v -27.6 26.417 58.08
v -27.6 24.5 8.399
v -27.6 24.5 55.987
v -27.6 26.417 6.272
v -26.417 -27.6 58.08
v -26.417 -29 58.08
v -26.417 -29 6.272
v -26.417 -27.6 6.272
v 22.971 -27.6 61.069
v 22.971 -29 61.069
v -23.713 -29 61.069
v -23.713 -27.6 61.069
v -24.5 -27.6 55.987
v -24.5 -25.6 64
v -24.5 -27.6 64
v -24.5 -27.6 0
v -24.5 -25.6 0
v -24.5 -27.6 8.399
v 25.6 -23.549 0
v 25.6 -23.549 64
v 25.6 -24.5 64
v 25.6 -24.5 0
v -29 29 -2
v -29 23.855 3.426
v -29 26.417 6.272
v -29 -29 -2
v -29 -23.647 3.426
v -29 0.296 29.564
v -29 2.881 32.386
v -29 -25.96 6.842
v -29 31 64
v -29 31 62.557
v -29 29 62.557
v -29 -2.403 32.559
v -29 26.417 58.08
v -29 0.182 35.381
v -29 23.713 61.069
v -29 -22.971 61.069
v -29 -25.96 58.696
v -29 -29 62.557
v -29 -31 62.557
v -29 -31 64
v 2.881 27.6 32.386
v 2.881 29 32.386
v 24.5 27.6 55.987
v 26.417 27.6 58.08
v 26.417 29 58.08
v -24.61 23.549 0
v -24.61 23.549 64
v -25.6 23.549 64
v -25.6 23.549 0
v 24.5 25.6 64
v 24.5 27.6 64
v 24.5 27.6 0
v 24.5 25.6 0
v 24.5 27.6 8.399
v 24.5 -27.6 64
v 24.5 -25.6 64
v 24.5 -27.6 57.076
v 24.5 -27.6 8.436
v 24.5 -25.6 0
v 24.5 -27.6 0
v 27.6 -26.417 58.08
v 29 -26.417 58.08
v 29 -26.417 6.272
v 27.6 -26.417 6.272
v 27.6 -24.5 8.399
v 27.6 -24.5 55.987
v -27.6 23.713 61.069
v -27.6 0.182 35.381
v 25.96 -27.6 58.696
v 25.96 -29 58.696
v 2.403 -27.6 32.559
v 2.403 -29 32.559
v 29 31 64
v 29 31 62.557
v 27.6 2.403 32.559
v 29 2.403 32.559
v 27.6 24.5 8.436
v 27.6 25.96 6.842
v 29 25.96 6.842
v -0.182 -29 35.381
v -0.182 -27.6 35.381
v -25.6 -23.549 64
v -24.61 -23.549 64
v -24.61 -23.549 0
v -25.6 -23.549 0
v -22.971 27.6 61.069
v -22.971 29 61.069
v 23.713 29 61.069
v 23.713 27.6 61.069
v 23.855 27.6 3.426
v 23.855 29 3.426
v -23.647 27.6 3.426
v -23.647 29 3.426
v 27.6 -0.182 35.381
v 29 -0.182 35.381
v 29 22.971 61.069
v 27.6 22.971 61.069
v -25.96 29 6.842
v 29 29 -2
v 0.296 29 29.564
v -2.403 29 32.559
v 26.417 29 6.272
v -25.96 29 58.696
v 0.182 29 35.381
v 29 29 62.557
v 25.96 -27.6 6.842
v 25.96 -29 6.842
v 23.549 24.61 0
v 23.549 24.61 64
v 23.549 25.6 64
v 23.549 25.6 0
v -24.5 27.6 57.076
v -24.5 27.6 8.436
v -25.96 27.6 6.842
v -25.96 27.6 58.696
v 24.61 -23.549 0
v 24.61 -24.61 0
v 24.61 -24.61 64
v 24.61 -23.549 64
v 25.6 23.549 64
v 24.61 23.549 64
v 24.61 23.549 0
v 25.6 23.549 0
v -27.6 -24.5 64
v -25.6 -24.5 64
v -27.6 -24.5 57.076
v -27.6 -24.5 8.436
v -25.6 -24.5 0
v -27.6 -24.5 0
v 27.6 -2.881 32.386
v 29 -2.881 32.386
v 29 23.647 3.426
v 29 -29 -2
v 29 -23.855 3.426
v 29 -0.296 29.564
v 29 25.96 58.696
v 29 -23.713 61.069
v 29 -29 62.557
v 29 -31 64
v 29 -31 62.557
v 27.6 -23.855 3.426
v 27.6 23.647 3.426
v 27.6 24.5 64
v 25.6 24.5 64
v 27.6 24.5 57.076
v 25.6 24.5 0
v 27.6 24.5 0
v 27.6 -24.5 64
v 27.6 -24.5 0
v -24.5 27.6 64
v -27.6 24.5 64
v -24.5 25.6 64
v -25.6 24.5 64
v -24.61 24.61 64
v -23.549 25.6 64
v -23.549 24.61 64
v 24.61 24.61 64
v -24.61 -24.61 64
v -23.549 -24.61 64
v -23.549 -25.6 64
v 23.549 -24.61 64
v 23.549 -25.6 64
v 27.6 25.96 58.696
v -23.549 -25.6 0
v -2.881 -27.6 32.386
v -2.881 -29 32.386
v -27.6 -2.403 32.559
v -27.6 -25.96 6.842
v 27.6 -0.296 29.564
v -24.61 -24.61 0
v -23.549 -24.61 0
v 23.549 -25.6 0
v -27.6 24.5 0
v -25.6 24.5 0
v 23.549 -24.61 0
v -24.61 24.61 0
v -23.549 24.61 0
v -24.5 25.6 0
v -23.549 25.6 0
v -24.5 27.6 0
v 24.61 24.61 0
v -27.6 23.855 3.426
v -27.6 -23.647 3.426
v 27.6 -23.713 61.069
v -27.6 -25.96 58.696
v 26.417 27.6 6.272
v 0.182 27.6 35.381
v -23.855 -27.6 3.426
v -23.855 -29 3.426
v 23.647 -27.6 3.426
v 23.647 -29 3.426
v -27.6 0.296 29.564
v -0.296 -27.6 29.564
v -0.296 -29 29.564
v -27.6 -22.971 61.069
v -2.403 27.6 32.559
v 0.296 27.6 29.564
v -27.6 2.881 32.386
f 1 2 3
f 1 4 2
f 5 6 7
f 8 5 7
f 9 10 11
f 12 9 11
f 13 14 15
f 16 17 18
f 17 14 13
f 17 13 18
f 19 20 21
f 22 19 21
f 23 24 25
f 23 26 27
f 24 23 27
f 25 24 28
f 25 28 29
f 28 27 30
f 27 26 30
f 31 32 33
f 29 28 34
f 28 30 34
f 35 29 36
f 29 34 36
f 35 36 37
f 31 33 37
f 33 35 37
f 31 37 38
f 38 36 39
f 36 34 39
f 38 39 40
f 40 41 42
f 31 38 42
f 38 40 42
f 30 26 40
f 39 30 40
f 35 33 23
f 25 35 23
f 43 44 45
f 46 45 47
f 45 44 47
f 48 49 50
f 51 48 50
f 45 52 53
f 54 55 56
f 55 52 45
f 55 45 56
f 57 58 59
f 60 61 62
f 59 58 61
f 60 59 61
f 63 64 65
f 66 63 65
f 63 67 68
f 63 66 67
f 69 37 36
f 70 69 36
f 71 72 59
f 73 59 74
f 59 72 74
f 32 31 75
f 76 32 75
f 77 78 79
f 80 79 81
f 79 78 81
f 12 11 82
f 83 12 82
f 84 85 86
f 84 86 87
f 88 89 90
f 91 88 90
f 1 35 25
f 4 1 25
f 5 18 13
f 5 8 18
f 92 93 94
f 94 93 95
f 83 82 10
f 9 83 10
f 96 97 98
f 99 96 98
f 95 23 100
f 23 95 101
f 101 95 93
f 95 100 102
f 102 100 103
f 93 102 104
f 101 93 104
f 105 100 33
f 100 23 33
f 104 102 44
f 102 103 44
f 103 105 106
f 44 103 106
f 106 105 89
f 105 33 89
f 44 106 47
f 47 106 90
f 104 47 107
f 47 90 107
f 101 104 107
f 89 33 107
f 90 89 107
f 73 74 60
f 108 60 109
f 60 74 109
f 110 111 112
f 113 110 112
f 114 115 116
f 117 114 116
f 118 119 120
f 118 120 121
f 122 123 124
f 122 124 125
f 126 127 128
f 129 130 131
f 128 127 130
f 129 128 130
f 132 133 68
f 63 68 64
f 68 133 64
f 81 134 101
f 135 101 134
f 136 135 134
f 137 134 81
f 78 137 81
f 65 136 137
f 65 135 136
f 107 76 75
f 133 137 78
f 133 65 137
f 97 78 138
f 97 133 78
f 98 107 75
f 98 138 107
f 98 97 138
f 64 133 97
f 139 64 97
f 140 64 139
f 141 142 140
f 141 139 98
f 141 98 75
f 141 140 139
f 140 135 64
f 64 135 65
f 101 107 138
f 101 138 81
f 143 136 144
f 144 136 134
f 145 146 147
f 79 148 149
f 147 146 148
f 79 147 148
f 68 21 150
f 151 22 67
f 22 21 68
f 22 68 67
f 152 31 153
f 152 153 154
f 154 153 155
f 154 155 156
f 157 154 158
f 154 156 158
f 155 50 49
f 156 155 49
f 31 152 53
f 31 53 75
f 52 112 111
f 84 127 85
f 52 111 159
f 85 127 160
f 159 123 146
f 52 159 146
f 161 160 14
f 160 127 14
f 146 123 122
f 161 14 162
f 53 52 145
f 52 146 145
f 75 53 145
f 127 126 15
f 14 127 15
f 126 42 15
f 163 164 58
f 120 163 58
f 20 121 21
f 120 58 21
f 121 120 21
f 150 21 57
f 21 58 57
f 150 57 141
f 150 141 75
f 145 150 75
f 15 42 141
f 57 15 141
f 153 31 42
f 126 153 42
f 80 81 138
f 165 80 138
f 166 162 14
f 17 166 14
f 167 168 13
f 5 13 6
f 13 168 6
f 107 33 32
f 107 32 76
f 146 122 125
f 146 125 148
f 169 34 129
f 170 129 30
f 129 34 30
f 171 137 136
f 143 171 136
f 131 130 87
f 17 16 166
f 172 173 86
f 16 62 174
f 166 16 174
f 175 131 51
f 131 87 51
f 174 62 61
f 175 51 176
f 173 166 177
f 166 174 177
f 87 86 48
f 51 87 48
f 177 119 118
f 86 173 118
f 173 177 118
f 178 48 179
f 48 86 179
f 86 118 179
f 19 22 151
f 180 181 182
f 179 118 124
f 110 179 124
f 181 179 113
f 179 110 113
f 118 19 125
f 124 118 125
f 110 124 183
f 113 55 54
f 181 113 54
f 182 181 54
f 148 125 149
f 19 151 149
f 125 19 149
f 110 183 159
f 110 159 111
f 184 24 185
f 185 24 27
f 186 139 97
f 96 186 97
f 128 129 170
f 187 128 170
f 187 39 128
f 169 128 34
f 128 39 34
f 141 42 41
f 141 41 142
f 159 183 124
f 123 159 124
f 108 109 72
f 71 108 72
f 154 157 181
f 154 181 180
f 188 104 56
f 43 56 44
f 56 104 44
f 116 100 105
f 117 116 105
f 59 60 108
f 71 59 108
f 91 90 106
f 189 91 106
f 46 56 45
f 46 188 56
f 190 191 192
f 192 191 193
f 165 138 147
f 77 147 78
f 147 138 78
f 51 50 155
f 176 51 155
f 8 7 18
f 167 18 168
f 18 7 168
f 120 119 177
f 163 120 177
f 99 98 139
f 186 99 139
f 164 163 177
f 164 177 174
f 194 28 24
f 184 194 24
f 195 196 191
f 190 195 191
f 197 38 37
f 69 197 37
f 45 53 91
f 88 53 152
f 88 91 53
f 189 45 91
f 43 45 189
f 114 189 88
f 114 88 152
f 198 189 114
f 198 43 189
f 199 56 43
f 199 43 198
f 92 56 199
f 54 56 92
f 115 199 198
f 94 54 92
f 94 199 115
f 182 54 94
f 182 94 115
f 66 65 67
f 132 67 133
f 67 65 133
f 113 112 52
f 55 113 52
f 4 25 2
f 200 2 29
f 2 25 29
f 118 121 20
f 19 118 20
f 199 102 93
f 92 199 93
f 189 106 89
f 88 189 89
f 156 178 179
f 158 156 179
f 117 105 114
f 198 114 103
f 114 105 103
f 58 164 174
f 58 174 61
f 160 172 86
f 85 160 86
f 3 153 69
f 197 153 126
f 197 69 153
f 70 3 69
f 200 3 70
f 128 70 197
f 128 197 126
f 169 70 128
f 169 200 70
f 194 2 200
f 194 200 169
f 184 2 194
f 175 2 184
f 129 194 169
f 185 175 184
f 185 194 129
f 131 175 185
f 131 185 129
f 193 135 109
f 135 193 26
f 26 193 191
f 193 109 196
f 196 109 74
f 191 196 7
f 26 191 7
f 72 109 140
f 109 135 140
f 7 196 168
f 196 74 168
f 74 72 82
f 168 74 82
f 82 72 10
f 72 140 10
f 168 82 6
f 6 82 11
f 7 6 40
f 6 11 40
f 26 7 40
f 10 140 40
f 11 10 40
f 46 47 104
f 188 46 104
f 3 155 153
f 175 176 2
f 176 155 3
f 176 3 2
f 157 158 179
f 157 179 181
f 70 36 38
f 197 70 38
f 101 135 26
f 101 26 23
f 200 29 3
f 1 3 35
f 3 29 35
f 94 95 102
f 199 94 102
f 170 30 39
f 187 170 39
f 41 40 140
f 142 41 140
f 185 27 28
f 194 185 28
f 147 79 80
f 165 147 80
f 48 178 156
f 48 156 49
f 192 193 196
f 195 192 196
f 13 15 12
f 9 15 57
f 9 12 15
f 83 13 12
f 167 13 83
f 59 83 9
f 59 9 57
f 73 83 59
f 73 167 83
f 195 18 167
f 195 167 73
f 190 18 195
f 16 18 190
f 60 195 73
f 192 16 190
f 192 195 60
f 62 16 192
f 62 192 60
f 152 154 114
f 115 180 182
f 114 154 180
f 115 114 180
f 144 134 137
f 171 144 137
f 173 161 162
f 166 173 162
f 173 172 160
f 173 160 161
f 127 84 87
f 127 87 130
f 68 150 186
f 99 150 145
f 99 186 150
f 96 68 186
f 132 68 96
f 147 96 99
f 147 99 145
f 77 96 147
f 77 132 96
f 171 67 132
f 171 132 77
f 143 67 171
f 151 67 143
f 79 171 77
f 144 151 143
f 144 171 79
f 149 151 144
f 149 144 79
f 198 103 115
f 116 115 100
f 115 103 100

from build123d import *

# Parameters (mm, degrees)
F1_DEPTH  = 64
F4_DEPTH  = 1.4
F6_DEPTH  = 2
F8_COUNT  = 4
F9_W      = 58
F9_H      = 1.4429360032
F10_DEPTH = 2


with BuildPart() as f1:
    # F0 (on Top) → F1 (new body)
    with BuildSketch(Plane.XY):
        Polygon((0, -27.6), (0, -29), (29, -29), (24.6101661921, -24.6101661921), (23.5489513725, -24.6101661921), (23.5489513725, -25.6), (24.5, -25.6), (24.5, -27.6), align=None)
    extrude(amount=F1_DEPTH)

    # F2: F1 across plane


with BuildPart() as f1_1:
    add(f1.part)
    add(f1.part.mirror(Plane.YZ))

    # F3 (on face) → F4 (cut)
    with BuildSketch(Plane.XZ.offset(29)):
        Polygon((-2.8809057808, 32.3860045068), (-26.4172293246, 58.0803863704), (-26.4172293246, 6.2722163275), align=None)
        Polygon((22.9713302106, 61.0693208873), (-23.7129572779, 61.0693208873), (-0.1818502389, 35.3806338326), align=None)
        Polygon((25.9602628648, 58.6964643958), (2.4026971831, 32.5591078504), (25.9602628648, 6.8415361457), align=None)
        Polygon((23.6471185492, 3.425611183), (-0.2963583588, 29.5644785245), (-23.855285719, 3.425611183), align=None)
    extrude(amount=-F4_DEPTH, mode=Mode.SUBTRACT)

    # F5 (on face) → F6 (join)
    with BuildSketch(Plane(origin=(0, 0, 0), x_dir=(1, 0, 0), z_dir=(0, 0, -1))):
        Polygon((29, 29), (-29, 29), (0, 0), align=None)
    extrude(amount=F6_DEPTH)


with BuildPart() as f8_1:
    # F8: instance of F1
    add(f1_1.part.rotate(Axis((0, 0, 25.6520500407), (0, 0, -1)), 1 * 360 / F8_COUNT))


with BuildPart() as f8_2:
    # F8: instance of F1
    add(f1_1.part.rotate(Axis((0, 0, 25.6520500407), (0, 0, -1)), 2 * 360 / F8_COUNT))


with BuildPart() as f8_3:
    # F8: instance of F1
    add(f1_1.part.rotate(Axis((0, 0, 25.6520500407), (0, 0, -1)), 3 * 360 / F8_COUNT))


with BuildPart() as f10:
    # F9 (on face) → F10 (new body)
    with BuildSketch(Plane.XZ.offset(29)):
        with Locations((0, 63.2785319984)):
            Rectangle(F9_W, F9_H)
    extrude(amount=F10_DEPTH)


with BuildPart() as f1_2:
    add(f1_1.part)

    add(f8_1.part)  # F11 merges F8_1

    add(f8_2.part)  # F11 merges F8_2

    add(f8_3.part)  # F11 merges F8_3

    add(f10.part)  # F11 merges F10
    # F11: F10 across plane
    add(f10.part.mirror(Plane.XZ))


solid = f1_2.part
